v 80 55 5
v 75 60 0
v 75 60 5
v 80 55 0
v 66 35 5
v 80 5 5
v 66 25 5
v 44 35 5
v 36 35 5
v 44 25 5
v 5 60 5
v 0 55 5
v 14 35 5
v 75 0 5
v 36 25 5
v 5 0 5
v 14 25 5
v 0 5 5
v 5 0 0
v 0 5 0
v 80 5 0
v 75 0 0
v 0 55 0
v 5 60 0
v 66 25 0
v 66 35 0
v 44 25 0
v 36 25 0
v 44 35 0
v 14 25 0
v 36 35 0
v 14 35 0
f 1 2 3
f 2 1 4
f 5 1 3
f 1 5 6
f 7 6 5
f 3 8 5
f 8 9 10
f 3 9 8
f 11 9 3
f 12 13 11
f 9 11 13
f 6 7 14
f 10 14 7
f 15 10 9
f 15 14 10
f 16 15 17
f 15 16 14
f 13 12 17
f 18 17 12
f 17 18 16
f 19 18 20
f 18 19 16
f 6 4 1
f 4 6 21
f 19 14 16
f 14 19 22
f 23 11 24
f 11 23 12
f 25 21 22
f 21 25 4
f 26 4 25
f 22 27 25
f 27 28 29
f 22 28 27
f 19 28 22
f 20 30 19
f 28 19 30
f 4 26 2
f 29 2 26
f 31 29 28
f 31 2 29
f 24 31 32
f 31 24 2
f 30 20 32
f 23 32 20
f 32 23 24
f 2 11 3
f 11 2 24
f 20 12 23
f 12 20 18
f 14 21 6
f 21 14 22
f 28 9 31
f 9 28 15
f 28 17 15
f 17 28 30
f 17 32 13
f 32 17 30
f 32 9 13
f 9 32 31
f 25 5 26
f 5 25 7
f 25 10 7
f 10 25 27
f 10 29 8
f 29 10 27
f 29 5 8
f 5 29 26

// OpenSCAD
$fn = 32;

// ----------------------------------------------------------------------
// Windowed plate: 2 voids, 80 x 60 x 5 mm
// ----------------------------------------------------------------------

// --- parameters (mm) ---
plate_l = 80;             // plate length, X
plate_w = 60;             // plate width, Y
plate_t = 5;              // plate thickness, Z
edge_margin = 10;         // wall from the plate edge to any window
windows = 2;              // number of windows in the row
win_l = 22;               // window length
win_w = 10;               // window width
win_pitch = 30;           // window pitch along X
depth_1 = 5;              // depth of void 1 (full thickness = through)
depth_2 = 5;              // depth of void 2 (full thickness = through)
corner_c = 5;             // corner chamfer of the plate

profile = [[5, 0], [75, 0], [80, 5], [80, 55], [75, 60], [5, 60], [0, 55], [0, 5]];  // primary outline, 8 points, counter clockwise
void_1 = [[14, 25], [36, 25], [36, 35], [14, 35]];  // window 1 of the row, 4 points
void_2 = [[44, 25], [66, 25], [66, 35], [44, 35]];  // window 2 of the row, 4 points

// --- the one profile operation ---
difference() {
  linear_extrude(height = plate_t) polygon(points = profile);
  translate([0, 0, -1])
    linear_extrude(height = plate_t + 2) polygon(points = void_1);
  translate([0, 0, -1])
    linear_extrude(height = plate_t + 2) polygon(points = void_2);
}
